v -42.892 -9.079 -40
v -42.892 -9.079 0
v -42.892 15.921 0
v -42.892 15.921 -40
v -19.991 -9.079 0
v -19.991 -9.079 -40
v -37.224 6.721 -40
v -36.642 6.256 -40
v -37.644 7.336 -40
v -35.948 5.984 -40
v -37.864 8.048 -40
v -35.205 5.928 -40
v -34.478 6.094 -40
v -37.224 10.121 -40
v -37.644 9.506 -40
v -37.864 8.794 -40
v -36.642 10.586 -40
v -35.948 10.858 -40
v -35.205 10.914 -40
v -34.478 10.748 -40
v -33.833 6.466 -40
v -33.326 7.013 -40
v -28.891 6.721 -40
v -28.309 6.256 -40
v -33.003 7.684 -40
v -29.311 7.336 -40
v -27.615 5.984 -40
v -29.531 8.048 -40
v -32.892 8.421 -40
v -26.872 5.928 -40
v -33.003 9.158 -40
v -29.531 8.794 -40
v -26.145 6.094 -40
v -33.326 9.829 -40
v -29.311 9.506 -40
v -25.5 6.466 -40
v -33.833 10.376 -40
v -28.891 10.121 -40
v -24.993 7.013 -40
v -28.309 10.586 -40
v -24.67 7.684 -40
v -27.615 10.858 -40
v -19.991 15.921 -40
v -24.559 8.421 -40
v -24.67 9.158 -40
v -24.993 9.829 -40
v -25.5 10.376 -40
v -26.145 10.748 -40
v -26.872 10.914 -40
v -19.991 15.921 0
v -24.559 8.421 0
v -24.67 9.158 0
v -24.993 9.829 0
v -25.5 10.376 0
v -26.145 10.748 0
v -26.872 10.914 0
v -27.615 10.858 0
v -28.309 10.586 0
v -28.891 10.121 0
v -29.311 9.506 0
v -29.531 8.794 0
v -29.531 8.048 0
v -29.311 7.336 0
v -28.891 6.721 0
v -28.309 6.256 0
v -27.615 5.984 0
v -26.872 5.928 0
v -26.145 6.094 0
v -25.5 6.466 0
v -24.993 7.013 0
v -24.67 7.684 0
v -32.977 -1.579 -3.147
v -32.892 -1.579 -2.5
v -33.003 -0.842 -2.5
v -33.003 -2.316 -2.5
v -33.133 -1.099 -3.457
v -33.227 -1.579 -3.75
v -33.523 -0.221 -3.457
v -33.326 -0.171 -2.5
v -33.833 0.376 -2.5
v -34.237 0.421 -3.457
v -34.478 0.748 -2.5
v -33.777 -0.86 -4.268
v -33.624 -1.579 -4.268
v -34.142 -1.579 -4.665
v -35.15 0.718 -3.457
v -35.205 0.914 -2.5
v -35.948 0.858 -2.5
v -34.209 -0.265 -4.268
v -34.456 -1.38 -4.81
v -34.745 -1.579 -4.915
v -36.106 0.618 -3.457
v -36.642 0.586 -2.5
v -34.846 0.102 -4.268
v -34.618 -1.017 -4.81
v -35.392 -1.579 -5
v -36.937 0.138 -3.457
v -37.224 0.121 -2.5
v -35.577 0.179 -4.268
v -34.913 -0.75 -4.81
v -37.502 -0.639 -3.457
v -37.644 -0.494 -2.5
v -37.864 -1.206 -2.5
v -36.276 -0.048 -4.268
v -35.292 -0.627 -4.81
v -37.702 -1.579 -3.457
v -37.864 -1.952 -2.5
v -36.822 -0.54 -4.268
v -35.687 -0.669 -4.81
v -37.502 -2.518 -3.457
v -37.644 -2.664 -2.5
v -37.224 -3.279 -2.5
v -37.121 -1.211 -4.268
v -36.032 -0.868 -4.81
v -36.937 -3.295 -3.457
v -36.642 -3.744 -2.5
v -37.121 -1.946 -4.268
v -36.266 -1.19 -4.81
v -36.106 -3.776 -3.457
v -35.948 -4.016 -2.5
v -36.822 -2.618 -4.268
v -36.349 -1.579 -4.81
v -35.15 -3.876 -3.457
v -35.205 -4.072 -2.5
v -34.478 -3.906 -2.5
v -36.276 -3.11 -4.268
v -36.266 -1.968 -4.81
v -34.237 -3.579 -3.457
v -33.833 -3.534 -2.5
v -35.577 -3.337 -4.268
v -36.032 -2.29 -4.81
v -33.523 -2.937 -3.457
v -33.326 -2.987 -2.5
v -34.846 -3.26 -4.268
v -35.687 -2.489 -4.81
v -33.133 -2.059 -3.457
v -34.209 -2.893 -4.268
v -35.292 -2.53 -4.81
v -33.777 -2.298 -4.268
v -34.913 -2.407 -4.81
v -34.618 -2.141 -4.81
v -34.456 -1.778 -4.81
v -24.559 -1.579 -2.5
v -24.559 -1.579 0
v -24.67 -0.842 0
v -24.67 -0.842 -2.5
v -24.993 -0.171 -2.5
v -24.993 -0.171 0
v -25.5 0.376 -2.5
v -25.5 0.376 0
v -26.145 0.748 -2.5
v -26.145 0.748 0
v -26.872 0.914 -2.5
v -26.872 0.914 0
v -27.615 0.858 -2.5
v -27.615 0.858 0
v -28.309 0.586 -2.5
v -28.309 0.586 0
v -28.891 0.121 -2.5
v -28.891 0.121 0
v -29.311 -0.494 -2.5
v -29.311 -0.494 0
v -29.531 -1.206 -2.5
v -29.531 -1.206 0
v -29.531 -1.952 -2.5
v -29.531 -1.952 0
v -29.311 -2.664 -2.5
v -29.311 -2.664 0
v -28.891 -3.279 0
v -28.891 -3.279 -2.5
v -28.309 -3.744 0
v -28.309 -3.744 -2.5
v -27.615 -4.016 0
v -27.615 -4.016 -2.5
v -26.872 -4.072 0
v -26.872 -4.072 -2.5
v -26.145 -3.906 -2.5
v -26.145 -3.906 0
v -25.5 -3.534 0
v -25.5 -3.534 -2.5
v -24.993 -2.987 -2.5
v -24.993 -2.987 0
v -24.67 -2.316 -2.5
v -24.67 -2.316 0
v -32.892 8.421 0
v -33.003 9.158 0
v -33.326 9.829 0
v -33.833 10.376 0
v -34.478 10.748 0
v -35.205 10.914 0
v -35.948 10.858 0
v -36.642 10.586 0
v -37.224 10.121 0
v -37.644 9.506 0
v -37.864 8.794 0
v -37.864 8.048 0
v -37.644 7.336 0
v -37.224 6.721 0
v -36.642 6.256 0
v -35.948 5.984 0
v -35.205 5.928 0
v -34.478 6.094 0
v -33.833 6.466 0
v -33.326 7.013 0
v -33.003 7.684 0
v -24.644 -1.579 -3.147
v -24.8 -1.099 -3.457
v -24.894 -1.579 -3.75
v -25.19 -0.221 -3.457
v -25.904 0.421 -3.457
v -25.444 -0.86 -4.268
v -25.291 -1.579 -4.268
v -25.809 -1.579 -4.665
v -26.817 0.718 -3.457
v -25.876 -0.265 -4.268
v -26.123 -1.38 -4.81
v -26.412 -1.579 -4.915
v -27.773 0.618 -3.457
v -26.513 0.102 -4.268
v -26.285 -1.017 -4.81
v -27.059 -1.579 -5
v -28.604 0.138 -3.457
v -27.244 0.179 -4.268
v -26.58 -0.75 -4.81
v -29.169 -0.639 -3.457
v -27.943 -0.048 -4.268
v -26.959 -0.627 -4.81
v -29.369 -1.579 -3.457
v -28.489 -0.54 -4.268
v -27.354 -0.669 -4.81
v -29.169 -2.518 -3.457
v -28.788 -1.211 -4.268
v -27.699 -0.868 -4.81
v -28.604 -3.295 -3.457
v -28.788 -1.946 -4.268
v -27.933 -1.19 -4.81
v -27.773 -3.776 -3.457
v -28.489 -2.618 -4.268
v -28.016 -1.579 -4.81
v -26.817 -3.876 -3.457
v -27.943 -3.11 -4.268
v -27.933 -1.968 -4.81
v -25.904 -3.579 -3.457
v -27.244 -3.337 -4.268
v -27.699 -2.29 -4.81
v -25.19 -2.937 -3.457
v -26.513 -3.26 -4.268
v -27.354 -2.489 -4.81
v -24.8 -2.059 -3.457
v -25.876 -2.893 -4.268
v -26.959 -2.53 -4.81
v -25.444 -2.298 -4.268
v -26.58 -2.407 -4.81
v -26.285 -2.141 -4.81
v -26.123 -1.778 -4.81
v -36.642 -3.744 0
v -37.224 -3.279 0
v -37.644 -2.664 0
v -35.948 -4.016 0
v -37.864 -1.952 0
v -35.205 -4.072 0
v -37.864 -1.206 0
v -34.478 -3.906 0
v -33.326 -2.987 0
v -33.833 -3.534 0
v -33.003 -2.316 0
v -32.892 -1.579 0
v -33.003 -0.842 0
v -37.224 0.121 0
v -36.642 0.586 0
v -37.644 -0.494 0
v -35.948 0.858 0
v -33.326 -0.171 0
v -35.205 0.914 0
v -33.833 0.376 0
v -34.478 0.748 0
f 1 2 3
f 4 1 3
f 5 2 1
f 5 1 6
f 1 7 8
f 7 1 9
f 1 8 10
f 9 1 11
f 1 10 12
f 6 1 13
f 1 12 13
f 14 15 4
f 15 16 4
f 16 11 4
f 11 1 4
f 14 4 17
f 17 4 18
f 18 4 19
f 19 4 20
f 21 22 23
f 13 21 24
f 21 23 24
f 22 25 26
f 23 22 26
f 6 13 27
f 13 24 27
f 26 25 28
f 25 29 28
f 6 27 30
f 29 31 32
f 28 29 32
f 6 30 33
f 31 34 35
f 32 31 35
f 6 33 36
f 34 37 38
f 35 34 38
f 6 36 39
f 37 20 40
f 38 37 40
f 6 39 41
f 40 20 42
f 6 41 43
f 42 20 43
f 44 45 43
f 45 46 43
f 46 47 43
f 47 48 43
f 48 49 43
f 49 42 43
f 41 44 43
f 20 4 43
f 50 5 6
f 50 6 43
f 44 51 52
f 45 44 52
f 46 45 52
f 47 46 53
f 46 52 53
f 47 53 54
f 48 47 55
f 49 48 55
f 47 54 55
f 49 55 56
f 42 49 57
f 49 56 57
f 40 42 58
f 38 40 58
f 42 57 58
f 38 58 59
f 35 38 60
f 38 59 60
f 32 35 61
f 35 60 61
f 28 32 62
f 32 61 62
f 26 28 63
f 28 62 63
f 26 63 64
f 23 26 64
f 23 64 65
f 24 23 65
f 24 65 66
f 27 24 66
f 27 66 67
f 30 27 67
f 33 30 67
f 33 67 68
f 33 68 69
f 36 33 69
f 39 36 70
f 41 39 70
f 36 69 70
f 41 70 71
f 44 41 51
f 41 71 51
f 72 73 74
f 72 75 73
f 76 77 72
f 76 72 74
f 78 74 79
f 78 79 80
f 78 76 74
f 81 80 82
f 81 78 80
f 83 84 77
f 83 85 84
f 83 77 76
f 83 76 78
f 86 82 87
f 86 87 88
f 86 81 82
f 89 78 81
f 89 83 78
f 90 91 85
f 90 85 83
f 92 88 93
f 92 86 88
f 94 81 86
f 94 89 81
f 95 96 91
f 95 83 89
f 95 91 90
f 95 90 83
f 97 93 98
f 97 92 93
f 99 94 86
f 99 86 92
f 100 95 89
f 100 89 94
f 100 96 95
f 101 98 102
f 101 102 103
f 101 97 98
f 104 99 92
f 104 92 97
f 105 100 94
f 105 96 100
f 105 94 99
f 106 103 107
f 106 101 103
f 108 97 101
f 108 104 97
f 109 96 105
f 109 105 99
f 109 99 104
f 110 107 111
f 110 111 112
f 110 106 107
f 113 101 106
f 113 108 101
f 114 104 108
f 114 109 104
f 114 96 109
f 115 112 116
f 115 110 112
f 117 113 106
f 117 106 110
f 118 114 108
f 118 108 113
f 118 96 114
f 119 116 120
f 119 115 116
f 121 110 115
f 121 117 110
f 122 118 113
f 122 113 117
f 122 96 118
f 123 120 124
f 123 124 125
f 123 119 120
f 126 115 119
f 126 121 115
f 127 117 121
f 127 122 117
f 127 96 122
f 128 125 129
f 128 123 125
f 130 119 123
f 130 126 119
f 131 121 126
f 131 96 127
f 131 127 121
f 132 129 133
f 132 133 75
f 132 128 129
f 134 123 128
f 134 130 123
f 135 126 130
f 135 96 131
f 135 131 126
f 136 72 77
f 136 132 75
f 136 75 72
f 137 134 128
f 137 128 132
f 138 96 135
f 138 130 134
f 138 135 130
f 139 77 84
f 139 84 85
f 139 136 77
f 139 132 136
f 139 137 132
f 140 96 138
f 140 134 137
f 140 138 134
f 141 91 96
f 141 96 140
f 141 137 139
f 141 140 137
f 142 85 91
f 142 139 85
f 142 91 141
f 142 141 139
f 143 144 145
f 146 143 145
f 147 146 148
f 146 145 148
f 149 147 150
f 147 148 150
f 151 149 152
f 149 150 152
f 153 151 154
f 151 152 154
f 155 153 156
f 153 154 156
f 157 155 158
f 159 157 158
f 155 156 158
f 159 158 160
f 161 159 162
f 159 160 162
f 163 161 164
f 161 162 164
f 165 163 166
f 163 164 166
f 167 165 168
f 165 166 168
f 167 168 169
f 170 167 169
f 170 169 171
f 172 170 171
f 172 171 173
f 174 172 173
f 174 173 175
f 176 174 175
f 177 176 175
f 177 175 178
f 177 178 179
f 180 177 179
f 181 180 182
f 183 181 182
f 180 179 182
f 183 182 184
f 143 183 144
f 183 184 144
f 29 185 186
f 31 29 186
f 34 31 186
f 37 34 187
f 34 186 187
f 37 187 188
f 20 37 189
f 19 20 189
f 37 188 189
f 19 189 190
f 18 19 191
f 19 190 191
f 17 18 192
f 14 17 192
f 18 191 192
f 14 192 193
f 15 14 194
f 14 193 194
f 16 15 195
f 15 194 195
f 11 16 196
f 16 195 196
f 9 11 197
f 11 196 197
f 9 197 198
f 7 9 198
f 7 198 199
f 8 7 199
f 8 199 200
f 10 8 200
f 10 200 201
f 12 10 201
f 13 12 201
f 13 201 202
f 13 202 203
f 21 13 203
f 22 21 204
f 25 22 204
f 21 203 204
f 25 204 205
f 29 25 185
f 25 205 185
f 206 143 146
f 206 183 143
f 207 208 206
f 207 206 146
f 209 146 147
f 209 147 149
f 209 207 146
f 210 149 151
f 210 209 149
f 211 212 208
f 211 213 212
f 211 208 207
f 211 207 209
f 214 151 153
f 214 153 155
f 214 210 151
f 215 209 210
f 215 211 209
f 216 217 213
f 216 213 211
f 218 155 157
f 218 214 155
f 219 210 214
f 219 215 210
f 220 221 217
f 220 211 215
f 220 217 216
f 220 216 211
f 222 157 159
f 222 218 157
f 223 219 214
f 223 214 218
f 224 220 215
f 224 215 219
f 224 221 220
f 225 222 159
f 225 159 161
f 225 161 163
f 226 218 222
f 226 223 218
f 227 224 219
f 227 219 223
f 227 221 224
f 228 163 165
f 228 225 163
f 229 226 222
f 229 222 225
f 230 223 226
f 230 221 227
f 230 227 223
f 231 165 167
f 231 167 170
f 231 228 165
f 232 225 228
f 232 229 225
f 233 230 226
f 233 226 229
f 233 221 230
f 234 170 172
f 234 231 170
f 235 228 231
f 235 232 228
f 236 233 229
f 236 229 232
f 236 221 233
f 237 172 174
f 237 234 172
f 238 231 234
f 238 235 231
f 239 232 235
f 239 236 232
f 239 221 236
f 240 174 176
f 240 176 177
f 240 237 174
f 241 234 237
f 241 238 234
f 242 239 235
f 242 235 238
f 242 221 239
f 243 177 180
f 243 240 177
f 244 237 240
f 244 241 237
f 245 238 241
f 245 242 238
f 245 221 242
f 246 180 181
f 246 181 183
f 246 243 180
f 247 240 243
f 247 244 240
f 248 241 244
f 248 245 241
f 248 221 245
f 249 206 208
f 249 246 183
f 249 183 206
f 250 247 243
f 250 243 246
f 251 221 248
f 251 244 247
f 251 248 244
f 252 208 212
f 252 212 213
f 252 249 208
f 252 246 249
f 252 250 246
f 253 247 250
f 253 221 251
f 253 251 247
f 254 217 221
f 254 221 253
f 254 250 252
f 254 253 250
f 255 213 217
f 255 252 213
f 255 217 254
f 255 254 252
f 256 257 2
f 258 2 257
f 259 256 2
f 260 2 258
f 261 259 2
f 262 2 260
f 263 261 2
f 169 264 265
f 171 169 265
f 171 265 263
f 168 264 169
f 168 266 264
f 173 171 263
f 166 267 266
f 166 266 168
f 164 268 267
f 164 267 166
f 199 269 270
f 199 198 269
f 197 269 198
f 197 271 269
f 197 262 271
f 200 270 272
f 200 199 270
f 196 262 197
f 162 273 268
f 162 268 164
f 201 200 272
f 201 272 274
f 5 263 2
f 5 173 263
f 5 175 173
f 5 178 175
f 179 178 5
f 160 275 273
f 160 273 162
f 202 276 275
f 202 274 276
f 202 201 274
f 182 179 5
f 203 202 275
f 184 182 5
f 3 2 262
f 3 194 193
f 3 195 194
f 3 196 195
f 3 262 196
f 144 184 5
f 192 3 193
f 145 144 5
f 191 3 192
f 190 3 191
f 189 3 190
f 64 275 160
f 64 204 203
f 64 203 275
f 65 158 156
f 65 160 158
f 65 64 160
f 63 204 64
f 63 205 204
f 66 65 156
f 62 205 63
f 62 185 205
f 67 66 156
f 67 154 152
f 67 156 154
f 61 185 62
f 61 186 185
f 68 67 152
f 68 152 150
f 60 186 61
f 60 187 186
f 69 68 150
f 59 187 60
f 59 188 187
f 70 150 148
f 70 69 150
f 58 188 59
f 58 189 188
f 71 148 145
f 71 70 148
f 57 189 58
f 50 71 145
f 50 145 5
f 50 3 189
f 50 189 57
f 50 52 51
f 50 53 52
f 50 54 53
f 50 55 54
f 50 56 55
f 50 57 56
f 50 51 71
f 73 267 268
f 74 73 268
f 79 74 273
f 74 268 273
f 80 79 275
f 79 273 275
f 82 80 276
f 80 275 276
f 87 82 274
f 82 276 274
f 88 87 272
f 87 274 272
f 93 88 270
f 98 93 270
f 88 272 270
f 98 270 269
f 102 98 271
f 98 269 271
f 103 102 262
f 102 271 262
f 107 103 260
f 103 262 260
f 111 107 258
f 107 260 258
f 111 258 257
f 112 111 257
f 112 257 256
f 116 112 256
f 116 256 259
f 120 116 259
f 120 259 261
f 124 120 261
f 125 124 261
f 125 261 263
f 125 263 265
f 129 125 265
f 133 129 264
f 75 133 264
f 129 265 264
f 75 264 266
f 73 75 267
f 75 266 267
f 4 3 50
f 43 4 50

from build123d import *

# Parameters (mm, degrees)
F0_W     = 22.9004416908
F0_H     = 25
F0_R     = 2.5
F1_DEPTH = 40
F2_DEPTH = 40
F3_DEPTH = 5
F4_R     = 2.5


# Not quite as in the source:
# - a feature names something its author has since deleted; it is built from what else it names


with BuildPart() as f1:
    # F0 (on Top) → F1 (new body)
    with BuildSketch(Plane.XY):
        with Locations((-31.441590436, 3.4210662183)):
            Rectangle(F0_W, F0_H)
        with Locations((-35.3918112814, -1.5789337817)):
            Circle(F0_R, mode=Mode.SUBTRACT)
        with Locations((-27.0588112814, -1.5789337817)):
            Circle(F0_R, mode=Mode.SUBTRACT)
        with Locations((-35.3918112814, 8.4210662183)):
            Circle(F0_R, mode=Mode.SUBTRACT)
        with Locations((-27.0588112814, 8.4210662183)):
            Circle(F0_R, mode=Mode.SUBTRACT)
        with Locations((-35.3918112814, 8.4210662183)):
            Circle(F0_R)
        with Locations((-27.0588112814, 8.4210662183)):
            Circle(F0_R)
        with Locations((-27.0588112814, -1.5789337817)):
            Circle(F0_R)
        with Locations((-35.3918112814, -1.5789337817)):
            Circle(F0_R)
    extrude(amount=-F1_DEPTH)

    # F0 (on Top) → F2 (cut)
    with BuildSketch(Plane.XY):
        with Locations((-35.3918112814, 8.4210662183)):
            Circle(F0_R)
        with Locations((-27.0588112814, 8.4210662183)):
            Circle(F0_R)
    extrude(amount=-F2_DEPTH, mode=Mode.SUBTRACT)

    # F0 (on Top) → F3 (cut)
    with BuildSketch(Plane.XY):
        with Locations((-35.3918112814, -1.5789337817)):
            Circle(F0_R)
        with Locations((-27.0588112814, -1.5789337817)):
            Circle(F0_R)
    extrude(amount=-F3_DEPTH, mode=Mode.SUBTRACT)

    # F4
    f4_edges = [f1.edges().sort_by_distance(p)[0] for p in [
        (-37.891811, -1.578934, -5),
        (-29.558811, -1.578934, -5),
    ]]
    fillet(f4_edges, radius=F4_R)


solid = f1.part
